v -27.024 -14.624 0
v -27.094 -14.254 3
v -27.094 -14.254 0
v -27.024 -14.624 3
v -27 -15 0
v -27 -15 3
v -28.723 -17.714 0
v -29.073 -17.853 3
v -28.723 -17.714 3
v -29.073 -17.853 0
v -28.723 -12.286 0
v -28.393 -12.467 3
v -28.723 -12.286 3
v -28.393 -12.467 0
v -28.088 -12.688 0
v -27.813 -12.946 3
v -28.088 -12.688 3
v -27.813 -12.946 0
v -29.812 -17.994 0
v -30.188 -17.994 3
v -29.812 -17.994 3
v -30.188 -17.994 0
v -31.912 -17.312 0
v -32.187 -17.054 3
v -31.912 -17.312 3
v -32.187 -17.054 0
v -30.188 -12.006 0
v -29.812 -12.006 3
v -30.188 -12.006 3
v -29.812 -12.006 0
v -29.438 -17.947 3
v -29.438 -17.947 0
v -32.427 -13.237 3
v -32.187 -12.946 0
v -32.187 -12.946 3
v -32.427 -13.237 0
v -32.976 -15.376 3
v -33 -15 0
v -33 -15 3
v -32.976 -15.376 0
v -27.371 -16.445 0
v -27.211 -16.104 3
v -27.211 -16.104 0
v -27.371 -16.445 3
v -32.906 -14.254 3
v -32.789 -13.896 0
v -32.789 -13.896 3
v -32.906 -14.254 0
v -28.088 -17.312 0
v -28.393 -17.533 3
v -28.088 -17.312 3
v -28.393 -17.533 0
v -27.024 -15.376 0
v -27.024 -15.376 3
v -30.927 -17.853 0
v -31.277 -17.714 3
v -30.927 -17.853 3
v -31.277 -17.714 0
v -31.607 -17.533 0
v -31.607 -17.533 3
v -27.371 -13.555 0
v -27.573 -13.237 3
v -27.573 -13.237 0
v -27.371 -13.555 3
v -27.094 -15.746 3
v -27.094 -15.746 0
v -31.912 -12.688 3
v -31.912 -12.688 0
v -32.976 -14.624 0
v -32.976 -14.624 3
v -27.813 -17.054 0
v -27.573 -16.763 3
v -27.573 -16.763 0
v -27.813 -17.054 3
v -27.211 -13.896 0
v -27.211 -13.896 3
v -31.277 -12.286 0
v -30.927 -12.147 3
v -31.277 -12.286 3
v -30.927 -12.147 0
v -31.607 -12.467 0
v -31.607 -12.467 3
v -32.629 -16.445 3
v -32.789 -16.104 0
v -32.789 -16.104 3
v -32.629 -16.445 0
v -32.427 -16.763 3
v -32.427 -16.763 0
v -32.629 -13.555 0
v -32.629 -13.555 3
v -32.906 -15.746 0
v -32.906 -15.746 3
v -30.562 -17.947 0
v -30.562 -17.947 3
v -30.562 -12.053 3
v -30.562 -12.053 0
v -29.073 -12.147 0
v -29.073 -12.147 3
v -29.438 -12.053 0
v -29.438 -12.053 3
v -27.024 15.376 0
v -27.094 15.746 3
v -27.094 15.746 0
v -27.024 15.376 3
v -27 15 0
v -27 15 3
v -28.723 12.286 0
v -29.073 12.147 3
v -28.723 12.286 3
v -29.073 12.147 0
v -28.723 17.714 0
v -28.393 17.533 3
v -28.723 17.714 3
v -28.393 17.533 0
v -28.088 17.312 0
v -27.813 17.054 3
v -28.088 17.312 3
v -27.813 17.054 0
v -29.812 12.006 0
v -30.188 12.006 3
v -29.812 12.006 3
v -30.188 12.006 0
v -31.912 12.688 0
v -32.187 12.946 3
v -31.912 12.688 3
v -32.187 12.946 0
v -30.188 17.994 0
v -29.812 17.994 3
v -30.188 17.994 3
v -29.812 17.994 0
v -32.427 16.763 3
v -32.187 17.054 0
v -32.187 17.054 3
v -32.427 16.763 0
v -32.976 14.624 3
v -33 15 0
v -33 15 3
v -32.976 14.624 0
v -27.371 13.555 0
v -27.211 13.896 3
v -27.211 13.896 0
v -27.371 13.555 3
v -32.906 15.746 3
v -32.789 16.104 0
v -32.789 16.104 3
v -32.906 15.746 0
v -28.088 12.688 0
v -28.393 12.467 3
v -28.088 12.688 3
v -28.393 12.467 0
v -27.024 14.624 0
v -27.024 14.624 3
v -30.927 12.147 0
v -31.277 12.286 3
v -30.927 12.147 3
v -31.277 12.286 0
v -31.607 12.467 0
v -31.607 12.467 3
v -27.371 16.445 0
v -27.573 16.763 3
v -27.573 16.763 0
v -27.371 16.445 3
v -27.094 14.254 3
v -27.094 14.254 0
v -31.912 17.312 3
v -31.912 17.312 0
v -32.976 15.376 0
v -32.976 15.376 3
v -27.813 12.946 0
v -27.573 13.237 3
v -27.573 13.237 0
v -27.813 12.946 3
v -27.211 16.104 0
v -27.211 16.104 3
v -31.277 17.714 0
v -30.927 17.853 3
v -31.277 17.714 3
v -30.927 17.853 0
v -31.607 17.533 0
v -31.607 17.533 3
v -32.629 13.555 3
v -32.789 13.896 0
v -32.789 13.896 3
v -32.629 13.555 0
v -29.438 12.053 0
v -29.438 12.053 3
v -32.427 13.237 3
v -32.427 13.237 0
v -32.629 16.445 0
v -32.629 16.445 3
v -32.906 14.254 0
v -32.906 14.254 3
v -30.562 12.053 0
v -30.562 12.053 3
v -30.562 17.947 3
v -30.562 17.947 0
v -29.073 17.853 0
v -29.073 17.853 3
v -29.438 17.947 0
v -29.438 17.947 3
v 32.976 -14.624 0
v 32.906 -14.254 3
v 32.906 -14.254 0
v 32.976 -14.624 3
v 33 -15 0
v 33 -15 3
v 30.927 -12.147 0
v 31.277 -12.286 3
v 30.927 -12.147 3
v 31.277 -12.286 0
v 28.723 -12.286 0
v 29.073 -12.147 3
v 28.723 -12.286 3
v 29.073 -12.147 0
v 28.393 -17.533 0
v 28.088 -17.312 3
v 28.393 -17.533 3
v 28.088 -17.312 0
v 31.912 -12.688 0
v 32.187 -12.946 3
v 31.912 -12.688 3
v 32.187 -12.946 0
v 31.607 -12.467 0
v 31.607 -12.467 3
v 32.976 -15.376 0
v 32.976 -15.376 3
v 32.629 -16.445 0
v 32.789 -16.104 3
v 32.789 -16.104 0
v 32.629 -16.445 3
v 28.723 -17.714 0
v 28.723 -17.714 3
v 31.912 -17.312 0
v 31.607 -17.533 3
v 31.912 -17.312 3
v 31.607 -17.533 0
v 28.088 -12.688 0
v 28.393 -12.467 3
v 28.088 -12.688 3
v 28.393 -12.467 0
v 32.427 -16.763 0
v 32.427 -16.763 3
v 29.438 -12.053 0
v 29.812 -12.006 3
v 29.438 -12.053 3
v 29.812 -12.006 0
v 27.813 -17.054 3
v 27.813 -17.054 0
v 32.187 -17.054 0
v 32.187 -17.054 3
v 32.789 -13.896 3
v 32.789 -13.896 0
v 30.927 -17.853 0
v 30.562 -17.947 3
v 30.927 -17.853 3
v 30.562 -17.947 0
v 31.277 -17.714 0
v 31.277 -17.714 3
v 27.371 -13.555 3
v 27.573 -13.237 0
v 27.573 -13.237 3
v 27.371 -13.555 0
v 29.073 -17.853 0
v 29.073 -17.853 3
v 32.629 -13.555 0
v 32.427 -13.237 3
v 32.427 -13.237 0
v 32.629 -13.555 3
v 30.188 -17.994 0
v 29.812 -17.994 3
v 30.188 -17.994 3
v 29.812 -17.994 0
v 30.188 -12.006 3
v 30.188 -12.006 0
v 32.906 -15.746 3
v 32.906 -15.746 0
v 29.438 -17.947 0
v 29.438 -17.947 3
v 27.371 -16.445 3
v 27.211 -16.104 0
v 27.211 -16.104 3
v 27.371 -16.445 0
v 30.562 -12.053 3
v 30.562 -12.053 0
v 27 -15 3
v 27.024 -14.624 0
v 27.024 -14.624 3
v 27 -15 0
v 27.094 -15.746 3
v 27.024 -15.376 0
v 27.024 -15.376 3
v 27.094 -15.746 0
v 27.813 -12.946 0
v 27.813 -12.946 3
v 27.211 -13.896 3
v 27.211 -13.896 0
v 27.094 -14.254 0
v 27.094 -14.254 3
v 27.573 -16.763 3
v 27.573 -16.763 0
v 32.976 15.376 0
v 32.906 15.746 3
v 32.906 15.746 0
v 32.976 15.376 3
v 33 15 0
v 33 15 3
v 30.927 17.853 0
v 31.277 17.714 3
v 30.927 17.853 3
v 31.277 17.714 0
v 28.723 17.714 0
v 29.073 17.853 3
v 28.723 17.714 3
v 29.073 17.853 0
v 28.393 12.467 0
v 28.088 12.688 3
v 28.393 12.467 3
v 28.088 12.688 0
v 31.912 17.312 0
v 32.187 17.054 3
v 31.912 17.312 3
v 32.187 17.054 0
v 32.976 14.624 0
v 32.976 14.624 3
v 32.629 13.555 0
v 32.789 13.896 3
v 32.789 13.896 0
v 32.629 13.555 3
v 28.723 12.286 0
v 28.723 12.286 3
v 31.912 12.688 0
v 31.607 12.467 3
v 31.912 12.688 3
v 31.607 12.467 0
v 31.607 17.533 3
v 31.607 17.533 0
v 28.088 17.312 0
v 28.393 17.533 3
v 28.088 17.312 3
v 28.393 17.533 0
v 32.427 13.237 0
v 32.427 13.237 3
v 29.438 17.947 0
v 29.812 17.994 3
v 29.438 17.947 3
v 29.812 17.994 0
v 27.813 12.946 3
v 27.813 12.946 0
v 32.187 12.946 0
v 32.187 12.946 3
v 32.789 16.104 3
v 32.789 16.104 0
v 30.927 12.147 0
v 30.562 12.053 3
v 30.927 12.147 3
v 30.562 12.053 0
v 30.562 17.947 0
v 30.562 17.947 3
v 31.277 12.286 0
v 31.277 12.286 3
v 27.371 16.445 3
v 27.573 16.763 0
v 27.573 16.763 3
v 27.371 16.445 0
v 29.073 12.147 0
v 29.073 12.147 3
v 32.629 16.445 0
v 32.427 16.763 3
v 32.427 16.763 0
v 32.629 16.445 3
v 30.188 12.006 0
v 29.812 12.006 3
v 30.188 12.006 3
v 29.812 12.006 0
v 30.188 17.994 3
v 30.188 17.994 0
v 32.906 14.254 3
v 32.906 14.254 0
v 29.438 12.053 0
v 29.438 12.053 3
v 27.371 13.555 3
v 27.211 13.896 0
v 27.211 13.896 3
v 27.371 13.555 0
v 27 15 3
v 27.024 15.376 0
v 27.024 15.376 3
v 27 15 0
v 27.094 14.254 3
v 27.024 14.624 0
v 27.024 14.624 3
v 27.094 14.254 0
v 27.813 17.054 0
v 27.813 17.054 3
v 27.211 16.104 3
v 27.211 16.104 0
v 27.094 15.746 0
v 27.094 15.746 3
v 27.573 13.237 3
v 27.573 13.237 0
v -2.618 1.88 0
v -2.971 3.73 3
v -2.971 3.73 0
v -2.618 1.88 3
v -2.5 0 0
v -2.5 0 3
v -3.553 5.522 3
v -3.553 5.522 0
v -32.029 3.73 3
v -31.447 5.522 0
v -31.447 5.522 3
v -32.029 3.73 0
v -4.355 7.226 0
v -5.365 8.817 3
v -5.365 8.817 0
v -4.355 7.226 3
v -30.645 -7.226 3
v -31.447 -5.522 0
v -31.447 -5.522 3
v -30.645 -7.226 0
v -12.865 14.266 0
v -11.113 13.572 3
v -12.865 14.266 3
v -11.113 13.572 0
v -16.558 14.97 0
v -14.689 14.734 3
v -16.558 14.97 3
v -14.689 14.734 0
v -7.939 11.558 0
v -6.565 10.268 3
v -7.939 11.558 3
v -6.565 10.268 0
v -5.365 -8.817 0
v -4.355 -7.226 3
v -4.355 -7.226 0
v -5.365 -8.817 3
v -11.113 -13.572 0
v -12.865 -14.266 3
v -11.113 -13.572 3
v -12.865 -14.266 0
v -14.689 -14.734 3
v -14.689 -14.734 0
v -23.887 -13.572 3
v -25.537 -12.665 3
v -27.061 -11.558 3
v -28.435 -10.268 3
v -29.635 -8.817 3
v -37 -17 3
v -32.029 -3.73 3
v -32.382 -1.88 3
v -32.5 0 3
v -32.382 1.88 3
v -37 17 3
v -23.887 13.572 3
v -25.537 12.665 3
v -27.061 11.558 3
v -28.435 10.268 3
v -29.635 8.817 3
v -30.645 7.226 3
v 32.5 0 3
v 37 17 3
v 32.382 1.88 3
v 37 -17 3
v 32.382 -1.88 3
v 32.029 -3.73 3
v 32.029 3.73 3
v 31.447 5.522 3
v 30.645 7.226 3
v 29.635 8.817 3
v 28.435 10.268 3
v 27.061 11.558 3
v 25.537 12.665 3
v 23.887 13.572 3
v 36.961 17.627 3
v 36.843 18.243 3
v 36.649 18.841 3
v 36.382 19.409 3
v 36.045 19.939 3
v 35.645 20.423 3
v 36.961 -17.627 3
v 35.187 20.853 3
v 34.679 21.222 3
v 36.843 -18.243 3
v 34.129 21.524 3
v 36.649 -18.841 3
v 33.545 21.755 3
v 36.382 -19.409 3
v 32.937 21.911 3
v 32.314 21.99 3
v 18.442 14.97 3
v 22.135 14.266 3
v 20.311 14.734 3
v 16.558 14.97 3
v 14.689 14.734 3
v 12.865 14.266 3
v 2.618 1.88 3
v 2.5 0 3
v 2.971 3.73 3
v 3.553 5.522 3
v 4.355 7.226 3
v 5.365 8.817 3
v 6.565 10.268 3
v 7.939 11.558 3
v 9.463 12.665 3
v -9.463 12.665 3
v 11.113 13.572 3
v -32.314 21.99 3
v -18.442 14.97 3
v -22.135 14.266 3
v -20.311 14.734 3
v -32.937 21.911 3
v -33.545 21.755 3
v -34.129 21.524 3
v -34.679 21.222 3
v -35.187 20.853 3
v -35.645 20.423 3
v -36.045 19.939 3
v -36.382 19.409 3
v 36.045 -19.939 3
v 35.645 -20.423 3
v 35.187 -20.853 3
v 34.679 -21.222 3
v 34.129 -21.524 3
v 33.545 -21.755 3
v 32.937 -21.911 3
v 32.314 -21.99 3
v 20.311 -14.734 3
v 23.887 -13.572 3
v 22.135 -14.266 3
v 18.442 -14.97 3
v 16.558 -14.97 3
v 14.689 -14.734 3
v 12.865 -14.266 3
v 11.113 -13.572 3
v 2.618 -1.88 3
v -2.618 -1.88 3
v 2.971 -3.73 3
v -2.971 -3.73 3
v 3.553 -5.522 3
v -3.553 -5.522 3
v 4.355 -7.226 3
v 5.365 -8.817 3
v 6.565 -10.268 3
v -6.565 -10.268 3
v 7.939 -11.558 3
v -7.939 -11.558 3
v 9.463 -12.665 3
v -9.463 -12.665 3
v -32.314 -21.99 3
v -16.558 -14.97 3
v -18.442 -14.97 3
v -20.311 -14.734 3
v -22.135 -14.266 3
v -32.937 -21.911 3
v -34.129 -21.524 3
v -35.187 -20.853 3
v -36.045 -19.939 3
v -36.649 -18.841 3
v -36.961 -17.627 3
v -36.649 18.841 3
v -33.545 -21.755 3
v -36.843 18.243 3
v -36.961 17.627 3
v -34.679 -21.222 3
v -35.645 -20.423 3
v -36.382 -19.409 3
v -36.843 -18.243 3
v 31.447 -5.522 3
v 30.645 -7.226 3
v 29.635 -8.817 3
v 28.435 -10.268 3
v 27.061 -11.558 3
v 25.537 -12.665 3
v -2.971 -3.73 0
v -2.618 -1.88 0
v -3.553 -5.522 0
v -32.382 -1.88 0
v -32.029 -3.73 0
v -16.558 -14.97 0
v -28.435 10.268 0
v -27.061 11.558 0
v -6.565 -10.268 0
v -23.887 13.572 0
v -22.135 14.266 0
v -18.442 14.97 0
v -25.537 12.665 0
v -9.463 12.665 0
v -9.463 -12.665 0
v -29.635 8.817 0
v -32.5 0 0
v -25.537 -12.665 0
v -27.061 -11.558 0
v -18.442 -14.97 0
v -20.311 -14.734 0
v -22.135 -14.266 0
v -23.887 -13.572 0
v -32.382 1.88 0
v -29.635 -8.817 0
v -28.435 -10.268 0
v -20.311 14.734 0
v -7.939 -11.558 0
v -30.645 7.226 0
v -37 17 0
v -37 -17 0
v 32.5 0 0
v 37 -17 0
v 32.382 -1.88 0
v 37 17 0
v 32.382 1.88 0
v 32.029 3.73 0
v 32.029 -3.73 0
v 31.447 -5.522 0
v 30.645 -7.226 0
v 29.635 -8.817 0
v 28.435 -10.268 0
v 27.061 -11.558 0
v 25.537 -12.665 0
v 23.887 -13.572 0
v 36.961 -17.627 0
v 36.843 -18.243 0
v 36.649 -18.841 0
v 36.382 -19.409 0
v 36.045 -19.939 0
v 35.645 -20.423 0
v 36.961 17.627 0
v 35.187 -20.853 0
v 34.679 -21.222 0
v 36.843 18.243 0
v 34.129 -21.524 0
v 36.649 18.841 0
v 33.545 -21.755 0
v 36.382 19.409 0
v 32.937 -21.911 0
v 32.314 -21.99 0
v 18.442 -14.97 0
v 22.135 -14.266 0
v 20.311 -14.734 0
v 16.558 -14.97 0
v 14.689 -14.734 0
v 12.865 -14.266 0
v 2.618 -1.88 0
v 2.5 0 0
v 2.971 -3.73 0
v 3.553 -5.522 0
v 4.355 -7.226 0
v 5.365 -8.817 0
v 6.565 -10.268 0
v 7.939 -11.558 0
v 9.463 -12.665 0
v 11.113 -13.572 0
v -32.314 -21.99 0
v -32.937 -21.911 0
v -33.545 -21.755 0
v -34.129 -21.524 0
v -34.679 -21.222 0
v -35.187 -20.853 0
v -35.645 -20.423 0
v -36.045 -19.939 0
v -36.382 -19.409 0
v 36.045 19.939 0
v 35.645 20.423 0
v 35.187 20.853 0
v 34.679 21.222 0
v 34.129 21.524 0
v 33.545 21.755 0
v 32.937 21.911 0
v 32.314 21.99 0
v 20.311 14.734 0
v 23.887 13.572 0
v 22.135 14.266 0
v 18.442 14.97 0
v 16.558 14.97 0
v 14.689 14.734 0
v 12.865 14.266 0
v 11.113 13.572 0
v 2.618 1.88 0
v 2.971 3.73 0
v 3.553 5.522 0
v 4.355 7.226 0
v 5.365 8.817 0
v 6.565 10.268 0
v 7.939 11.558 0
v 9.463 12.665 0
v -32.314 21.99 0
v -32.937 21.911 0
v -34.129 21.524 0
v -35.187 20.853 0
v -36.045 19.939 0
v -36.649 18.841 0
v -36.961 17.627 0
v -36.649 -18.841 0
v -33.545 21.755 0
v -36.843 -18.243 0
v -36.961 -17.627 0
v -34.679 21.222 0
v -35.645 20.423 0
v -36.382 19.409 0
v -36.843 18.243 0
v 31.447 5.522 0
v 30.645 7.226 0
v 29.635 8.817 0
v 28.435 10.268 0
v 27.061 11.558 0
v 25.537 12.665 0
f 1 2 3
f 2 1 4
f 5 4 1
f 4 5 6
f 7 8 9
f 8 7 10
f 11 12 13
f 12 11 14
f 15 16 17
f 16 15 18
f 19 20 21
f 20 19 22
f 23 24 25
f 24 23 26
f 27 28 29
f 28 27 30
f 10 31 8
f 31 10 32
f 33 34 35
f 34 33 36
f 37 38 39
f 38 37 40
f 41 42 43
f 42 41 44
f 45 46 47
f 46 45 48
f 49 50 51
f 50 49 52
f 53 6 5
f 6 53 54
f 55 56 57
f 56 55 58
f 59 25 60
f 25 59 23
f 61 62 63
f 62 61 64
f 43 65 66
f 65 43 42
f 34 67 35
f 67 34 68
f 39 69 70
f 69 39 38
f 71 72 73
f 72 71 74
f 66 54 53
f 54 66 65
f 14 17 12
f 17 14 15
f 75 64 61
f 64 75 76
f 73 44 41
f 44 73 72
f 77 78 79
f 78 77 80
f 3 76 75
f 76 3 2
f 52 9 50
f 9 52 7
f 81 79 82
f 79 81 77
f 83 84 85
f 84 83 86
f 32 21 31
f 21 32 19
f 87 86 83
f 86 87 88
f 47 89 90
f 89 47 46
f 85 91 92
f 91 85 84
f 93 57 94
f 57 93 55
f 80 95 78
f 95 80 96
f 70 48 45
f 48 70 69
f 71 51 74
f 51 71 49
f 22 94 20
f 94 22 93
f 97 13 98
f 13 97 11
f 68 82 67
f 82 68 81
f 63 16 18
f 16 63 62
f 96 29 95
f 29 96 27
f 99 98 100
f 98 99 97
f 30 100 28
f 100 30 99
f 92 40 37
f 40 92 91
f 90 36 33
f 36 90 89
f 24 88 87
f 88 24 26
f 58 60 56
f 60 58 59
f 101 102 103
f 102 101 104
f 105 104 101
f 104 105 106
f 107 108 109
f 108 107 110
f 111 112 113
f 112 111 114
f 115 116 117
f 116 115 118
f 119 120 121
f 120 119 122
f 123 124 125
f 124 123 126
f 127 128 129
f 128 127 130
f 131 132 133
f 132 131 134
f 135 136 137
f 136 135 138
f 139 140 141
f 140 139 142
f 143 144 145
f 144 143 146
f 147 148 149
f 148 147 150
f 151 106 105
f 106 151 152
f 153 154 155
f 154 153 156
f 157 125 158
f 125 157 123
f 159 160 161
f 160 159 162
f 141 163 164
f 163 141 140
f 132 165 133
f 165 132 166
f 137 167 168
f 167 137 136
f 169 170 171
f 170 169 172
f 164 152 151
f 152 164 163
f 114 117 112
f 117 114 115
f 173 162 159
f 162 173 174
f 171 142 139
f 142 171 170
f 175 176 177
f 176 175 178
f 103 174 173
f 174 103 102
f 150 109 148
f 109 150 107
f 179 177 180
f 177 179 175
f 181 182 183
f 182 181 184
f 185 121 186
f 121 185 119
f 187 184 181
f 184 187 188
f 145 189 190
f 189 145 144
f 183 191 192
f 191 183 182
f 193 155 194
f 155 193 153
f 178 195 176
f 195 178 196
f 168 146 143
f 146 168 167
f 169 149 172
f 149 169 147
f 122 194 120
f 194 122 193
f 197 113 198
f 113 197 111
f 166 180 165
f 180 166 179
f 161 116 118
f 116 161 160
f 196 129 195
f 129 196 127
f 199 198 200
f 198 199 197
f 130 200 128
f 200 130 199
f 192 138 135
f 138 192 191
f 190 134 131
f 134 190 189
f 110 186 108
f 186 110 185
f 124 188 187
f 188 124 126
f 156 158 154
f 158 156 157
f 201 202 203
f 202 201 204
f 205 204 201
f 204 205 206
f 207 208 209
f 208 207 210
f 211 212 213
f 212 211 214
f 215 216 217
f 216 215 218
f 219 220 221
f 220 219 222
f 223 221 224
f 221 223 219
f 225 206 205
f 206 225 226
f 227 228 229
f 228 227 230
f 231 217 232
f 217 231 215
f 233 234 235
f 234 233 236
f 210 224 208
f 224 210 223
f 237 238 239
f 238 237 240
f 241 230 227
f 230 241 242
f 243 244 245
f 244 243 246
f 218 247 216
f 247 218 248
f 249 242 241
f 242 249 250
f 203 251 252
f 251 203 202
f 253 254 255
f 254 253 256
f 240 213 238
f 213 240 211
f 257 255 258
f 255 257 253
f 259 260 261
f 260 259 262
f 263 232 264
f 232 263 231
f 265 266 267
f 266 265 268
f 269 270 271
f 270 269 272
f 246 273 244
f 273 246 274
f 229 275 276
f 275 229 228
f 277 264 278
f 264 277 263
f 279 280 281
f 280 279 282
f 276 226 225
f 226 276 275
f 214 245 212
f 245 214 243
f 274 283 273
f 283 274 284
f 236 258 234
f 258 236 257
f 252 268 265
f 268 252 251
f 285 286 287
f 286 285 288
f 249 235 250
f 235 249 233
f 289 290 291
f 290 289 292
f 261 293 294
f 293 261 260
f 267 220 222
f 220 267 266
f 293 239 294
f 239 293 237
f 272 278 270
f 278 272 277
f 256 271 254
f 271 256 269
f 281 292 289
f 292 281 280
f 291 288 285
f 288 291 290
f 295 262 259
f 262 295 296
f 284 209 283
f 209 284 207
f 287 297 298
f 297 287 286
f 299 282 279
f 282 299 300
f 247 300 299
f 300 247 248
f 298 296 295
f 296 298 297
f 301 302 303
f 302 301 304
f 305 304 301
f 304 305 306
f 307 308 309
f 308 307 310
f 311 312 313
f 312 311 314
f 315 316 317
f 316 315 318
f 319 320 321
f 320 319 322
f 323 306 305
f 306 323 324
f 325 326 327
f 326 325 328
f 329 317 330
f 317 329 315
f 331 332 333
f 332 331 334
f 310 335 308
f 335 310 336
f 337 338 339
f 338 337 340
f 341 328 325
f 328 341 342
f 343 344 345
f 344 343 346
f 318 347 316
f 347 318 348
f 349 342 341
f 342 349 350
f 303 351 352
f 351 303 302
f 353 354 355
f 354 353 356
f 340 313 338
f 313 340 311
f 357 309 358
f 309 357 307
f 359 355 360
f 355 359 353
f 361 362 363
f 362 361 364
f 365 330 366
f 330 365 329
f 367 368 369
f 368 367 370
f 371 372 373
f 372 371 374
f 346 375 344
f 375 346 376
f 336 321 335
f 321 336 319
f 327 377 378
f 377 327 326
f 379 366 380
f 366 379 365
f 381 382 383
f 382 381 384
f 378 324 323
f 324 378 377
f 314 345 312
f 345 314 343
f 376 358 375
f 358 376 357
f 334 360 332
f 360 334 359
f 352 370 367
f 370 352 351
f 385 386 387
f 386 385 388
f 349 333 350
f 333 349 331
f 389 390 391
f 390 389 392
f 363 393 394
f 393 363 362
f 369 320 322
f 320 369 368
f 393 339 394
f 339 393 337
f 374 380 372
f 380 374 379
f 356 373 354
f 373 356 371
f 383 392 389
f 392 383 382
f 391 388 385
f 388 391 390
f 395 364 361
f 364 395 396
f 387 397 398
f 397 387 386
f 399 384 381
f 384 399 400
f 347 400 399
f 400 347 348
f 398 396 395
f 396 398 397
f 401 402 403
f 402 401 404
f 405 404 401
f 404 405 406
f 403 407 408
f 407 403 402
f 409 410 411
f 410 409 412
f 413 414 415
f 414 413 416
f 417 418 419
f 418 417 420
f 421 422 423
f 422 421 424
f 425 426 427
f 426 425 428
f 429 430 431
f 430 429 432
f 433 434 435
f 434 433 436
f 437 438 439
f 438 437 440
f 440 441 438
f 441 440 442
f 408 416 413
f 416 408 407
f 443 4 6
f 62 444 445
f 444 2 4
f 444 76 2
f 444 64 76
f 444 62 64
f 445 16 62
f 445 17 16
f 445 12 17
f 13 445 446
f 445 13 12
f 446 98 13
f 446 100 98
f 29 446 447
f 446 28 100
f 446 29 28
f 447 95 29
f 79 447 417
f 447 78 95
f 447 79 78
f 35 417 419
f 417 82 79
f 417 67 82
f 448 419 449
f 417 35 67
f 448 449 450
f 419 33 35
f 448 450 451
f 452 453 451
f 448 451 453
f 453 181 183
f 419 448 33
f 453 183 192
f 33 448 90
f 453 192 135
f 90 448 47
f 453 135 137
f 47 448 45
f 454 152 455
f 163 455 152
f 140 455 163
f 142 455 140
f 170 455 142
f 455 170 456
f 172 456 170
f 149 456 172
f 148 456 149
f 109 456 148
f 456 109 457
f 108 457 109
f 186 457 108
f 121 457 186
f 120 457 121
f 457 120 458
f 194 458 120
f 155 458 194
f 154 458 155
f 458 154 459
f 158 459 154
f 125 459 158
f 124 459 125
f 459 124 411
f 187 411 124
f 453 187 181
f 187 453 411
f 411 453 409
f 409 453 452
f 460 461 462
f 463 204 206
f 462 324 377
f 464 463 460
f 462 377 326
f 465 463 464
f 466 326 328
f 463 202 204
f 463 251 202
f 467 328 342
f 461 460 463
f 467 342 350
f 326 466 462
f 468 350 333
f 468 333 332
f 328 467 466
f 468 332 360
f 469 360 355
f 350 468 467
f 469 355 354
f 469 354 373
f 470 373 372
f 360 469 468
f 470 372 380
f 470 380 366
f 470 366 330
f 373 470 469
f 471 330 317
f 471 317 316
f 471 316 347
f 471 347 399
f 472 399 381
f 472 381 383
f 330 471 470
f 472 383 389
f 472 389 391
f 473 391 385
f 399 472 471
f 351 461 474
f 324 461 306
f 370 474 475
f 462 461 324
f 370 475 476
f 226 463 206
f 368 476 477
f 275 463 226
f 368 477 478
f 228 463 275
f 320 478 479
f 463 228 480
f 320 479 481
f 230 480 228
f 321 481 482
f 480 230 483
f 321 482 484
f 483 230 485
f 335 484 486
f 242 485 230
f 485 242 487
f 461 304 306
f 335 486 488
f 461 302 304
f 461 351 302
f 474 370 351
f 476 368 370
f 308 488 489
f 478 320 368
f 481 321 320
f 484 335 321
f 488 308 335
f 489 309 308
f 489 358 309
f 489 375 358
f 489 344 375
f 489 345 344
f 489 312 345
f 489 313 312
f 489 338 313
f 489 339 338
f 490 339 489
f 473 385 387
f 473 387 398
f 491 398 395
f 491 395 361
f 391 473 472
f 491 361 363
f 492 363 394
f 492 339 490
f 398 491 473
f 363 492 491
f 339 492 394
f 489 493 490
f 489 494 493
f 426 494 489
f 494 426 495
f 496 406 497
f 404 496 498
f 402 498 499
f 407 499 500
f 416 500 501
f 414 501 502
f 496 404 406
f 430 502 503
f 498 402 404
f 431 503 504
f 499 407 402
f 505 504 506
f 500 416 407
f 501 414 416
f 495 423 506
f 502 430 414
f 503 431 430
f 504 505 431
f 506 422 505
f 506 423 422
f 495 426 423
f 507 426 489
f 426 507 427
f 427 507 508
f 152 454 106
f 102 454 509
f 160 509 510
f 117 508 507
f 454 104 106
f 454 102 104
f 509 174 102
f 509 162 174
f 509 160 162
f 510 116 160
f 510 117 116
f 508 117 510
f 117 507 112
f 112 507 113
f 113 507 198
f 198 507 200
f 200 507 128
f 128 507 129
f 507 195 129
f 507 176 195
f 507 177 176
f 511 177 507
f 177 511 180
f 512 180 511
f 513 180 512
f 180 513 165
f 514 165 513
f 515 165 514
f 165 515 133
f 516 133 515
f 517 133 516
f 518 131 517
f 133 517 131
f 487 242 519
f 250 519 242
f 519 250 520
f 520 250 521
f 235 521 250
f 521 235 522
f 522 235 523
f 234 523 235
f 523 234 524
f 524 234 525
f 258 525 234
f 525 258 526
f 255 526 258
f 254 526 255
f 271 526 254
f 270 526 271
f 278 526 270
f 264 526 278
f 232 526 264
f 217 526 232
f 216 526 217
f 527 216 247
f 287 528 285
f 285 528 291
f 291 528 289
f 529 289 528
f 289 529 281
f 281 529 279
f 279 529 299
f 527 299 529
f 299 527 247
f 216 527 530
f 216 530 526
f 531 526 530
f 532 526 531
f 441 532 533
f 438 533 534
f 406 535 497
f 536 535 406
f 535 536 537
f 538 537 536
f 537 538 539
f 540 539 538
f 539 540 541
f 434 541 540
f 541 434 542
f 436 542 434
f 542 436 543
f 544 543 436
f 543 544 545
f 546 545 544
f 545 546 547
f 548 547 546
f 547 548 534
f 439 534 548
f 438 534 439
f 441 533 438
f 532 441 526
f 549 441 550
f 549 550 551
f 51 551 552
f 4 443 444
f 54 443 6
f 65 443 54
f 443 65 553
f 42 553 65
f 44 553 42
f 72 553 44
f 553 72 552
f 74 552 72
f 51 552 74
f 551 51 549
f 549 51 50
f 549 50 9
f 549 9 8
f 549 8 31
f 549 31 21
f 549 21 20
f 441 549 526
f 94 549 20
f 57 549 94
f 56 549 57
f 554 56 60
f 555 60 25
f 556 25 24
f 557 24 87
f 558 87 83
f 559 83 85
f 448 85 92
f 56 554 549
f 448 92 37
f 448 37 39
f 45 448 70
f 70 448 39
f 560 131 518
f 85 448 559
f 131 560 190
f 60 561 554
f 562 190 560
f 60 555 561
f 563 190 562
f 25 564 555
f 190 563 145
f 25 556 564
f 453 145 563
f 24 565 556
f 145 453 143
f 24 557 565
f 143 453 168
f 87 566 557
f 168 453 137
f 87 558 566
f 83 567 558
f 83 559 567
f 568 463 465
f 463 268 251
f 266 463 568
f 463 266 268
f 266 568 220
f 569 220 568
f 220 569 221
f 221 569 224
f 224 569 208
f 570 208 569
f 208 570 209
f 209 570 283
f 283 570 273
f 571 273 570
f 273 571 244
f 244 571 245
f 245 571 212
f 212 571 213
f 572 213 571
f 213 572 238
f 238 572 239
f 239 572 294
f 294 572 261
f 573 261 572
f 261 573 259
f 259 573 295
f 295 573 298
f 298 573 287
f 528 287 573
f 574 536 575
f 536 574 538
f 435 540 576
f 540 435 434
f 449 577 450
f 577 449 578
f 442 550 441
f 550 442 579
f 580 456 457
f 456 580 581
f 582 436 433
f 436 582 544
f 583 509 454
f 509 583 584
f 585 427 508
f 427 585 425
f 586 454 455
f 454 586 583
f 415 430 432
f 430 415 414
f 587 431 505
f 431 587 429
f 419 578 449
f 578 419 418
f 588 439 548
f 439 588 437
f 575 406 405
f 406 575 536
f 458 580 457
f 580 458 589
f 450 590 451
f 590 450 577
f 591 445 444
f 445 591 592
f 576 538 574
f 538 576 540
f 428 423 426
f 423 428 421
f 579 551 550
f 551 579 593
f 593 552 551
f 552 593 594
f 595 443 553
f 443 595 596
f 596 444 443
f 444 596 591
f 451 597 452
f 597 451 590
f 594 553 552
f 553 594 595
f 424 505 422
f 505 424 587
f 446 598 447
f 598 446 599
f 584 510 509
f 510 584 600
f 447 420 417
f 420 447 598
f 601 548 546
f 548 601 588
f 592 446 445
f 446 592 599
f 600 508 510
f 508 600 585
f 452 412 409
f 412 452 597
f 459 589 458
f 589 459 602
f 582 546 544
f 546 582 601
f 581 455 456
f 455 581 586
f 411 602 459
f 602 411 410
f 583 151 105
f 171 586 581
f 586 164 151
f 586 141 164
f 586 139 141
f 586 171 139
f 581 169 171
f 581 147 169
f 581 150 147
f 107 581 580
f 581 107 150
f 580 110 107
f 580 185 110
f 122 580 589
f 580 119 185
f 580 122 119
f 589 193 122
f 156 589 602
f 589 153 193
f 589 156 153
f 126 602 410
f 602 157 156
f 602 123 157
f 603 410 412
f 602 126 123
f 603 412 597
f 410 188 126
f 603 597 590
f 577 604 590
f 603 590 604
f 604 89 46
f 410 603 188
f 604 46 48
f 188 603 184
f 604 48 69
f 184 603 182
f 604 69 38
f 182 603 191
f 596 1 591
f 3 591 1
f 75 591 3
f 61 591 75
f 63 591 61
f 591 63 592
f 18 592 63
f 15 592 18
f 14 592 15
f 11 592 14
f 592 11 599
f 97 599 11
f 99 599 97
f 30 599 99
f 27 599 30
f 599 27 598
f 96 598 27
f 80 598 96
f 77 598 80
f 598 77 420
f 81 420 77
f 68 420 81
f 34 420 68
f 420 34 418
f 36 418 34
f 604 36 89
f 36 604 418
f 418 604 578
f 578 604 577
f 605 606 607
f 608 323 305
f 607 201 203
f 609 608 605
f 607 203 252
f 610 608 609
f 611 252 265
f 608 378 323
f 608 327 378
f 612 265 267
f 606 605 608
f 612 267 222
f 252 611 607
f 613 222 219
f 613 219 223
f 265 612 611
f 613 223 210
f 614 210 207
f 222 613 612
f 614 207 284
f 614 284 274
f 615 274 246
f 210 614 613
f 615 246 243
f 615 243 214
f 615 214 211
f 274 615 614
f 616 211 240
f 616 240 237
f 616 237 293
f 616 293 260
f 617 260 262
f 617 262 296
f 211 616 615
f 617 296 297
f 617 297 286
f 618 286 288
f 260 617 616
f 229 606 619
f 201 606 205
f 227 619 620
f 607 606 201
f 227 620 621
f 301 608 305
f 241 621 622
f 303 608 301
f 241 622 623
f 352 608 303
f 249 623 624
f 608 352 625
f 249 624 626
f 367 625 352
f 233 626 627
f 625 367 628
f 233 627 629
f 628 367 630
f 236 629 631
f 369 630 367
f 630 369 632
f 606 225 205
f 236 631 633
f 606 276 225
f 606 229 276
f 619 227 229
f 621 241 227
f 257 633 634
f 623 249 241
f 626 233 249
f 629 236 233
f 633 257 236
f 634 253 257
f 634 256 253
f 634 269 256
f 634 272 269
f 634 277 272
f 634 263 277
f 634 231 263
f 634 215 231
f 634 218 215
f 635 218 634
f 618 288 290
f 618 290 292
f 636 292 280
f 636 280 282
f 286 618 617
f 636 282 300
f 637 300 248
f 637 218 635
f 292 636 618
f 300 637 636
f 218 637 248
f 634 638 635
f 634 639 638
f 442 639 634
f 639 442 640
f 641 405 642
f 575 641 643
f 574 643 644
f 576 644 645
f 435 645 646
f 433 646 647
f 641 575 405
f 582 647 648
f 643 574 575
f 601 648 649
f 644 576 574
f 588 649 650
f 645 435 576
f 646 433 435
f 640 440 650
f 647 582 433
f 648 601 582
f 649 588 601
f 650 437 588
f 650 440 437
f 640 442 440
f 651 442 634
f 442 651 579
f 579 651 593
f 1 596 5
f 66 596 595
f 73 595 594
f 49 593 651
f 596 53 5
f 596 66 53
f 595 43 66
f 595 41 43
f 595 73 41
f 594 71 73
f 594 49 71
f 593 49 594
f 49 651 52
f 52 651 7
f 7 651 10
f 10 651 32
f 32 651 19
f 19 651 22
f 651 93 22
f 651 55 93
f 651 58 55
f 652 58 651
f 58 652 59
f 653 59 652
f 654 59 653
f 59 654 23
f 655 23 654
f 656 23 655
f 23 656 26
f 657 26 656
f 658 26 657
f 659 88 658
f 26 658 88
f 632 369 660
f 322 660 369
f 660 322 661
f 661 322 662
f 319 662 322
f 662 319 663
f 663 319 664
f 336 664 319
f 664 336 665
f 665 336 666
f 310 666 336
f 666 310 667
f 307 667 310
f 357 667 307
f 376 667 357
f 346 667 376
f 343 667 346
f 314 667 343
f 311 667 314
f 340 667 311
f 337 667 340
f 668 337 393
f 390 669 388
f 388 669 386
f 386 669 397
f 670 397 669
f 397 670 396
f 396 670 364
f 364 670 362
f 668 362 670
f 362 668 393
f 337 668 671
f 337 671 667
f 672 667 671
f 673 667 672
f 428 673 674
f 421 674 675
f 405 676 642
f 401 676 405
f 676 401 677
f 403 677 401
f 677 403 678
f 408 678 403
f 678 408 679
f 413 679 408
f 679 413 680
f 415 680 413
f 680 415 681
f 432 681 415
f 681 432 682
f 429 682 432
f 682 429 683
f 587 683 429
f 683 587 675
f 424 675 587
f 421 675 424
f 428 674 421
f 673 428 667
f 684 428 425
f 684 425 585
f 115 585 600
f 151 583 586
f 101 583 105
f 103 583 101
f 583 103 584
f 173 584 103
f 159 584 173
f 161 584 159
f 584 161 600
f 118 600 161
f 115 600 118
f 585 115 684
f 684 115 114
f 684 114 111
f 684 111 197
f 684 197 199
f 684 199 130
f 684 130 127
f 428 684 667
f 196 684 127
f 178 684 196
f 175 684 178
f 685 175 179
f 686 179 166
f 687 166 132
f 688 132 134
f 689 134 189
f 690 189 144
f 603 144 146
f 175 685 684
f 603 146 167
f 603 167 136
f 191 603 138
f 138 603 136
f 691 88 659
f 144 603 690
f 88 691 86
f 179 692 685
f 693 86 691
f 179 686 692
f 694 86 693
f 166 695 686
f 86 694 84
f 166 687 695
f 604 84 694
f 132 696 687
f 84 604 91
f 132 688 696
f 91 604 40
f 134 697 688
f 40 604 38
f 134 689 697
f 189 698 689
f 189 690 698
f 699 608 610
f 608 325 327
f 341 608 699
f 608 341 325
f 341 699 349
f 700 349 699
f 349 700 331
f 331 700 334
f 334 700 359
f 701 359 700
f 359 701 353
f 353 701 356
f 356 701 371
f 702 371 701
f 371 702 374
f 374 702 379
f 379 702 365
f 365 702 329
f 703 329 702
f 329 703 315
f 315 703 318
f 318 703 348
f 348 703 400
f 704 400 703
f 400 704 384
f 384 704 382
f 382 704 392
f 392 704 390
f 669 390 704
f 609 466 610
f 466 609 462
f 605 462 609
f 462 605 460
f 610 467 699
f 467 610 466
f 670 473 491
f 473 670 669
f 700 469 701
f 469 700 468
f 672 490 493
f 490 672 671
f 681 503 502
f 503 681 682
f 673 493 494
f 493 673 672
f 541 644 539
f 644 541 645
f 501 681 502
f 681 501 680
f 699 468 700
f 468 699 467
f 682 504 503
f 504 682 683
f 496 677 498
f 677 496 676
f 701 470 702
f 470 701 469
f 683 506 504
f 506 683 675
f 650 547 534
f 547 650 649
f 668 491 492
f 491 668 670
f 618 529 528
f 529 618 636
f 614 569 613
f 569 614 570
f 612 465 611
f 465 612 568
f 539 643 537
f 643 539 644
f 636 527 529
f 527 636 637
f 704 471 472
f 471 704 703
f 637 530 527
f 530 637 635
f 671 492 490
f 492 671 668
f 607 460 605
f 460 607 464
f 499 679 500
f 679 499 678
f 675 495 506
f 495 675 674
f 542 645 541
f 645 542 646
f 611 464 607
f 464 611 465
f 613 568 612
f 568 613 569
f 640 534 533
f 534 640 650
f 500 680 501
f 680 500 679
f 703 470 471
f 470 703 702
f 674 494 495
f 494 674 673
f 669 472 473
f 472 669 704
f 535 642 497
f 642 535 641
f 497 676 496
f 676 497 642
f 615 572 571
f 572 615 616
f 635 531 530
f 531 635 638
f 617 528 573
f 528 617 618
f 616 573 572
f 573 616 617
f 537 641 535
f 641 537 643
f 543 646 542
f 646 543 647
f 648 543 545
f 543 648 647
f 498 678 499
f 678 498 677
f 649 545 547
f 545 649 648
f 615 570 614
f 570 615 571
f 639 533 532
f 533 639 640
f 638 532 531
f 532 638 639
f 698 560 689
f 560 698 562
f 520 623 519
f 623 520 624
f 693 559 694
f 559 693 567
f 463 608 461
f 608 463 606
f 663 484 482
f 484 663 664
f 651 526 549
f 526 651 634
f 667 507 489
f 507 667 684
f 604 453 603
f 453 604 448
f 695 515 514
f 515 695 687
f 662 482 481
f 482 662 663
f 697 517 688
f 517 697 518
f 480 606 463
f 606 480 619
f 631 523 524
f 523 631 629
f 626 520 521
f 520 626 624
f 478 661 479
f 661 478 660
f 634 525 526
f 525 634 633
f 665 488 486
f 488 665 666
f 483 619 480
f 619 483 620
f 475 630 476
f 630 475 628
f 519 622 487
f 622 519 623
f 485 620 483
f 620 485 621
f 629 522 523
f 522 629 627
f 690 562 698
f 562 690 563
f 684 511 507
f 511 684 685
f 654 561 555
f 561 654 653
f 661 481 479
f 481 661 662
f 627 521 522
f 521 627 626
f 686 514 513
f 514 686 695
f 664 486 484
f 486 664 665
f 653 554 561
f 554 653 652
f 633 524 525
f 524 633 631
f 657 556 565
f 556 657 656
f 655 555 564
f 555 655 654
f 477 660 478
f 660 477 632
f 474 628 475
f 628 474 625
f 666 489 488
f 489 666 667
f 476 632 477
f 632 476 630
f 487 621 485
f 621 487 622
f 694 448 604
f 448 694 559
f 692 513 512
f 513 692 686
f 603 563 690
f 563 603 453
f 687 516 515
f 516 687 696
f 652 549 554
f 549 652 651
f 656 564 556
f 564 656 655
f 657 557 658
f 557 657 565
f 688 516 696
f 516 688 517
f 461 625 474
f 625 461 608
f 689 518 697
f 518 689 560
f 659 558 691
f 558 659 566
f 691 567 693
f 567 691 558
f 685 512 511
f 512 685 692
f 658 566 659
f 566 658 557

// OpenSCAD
$fn = 50;

difference() {
	union() {
		hull() {
			translate(v = [-32.0, 17.0, 0]) {
				cylinder(h = 3, r = 5);
			}
			translate(v = [32.0, 17.0, 0]) {
				cylinder(h = 3, r = 5);
			}
			translate(v = [-32.0, -17.0, 0]) {
				cylinder(h = 3, r = 5);
			}
			translate(v = [32.0, -17.0, 0]) {
				cylinder(h = 3, r = 5);
			}
		}
	}
	union() {
		translate(v = [-30.0, -15.0, -100.0]) {
			cylinder(h = 200, r = 3.0);
		}
		translate(v = [-30.0, 15.0, -100.0]) {
			cylinder(h = 200, r = 3.0);
		}
		translate(v = [30.0, -15.0, -100.0]) {
			cylinder(h = 200, r = 3.0);
		}
		translate(v = [30.0, 15.0, -100.0]) {
			cylinder(h = 200, r = 3.0);
		}
		translate(v = [-30.0, -15.0, -100.0]) {
			cylinder(h = 200, r = 1.5);
		}
		translate(v = [-30.0, 15.0, -100.0]) {
			cylinder(h = 200, r = 1.5);
		}
		translate(v = [30.0, -15.0, -100.0]) {
			cylinder(h = 200, r = 1.5);
		}
		translate(v = [30.0, 15.0, -100.0]) {
			cylinder(h = 200, r = 1.5);
		}
		translate(v = [-17.5, 0, 0.0]) {
			cylinder(h = 3, r = 15.0);
		}
		translate(v = [17.5, 0, 0.0]) {
			cylinder(h = 3, r = 15.0);
		}
	}
}
